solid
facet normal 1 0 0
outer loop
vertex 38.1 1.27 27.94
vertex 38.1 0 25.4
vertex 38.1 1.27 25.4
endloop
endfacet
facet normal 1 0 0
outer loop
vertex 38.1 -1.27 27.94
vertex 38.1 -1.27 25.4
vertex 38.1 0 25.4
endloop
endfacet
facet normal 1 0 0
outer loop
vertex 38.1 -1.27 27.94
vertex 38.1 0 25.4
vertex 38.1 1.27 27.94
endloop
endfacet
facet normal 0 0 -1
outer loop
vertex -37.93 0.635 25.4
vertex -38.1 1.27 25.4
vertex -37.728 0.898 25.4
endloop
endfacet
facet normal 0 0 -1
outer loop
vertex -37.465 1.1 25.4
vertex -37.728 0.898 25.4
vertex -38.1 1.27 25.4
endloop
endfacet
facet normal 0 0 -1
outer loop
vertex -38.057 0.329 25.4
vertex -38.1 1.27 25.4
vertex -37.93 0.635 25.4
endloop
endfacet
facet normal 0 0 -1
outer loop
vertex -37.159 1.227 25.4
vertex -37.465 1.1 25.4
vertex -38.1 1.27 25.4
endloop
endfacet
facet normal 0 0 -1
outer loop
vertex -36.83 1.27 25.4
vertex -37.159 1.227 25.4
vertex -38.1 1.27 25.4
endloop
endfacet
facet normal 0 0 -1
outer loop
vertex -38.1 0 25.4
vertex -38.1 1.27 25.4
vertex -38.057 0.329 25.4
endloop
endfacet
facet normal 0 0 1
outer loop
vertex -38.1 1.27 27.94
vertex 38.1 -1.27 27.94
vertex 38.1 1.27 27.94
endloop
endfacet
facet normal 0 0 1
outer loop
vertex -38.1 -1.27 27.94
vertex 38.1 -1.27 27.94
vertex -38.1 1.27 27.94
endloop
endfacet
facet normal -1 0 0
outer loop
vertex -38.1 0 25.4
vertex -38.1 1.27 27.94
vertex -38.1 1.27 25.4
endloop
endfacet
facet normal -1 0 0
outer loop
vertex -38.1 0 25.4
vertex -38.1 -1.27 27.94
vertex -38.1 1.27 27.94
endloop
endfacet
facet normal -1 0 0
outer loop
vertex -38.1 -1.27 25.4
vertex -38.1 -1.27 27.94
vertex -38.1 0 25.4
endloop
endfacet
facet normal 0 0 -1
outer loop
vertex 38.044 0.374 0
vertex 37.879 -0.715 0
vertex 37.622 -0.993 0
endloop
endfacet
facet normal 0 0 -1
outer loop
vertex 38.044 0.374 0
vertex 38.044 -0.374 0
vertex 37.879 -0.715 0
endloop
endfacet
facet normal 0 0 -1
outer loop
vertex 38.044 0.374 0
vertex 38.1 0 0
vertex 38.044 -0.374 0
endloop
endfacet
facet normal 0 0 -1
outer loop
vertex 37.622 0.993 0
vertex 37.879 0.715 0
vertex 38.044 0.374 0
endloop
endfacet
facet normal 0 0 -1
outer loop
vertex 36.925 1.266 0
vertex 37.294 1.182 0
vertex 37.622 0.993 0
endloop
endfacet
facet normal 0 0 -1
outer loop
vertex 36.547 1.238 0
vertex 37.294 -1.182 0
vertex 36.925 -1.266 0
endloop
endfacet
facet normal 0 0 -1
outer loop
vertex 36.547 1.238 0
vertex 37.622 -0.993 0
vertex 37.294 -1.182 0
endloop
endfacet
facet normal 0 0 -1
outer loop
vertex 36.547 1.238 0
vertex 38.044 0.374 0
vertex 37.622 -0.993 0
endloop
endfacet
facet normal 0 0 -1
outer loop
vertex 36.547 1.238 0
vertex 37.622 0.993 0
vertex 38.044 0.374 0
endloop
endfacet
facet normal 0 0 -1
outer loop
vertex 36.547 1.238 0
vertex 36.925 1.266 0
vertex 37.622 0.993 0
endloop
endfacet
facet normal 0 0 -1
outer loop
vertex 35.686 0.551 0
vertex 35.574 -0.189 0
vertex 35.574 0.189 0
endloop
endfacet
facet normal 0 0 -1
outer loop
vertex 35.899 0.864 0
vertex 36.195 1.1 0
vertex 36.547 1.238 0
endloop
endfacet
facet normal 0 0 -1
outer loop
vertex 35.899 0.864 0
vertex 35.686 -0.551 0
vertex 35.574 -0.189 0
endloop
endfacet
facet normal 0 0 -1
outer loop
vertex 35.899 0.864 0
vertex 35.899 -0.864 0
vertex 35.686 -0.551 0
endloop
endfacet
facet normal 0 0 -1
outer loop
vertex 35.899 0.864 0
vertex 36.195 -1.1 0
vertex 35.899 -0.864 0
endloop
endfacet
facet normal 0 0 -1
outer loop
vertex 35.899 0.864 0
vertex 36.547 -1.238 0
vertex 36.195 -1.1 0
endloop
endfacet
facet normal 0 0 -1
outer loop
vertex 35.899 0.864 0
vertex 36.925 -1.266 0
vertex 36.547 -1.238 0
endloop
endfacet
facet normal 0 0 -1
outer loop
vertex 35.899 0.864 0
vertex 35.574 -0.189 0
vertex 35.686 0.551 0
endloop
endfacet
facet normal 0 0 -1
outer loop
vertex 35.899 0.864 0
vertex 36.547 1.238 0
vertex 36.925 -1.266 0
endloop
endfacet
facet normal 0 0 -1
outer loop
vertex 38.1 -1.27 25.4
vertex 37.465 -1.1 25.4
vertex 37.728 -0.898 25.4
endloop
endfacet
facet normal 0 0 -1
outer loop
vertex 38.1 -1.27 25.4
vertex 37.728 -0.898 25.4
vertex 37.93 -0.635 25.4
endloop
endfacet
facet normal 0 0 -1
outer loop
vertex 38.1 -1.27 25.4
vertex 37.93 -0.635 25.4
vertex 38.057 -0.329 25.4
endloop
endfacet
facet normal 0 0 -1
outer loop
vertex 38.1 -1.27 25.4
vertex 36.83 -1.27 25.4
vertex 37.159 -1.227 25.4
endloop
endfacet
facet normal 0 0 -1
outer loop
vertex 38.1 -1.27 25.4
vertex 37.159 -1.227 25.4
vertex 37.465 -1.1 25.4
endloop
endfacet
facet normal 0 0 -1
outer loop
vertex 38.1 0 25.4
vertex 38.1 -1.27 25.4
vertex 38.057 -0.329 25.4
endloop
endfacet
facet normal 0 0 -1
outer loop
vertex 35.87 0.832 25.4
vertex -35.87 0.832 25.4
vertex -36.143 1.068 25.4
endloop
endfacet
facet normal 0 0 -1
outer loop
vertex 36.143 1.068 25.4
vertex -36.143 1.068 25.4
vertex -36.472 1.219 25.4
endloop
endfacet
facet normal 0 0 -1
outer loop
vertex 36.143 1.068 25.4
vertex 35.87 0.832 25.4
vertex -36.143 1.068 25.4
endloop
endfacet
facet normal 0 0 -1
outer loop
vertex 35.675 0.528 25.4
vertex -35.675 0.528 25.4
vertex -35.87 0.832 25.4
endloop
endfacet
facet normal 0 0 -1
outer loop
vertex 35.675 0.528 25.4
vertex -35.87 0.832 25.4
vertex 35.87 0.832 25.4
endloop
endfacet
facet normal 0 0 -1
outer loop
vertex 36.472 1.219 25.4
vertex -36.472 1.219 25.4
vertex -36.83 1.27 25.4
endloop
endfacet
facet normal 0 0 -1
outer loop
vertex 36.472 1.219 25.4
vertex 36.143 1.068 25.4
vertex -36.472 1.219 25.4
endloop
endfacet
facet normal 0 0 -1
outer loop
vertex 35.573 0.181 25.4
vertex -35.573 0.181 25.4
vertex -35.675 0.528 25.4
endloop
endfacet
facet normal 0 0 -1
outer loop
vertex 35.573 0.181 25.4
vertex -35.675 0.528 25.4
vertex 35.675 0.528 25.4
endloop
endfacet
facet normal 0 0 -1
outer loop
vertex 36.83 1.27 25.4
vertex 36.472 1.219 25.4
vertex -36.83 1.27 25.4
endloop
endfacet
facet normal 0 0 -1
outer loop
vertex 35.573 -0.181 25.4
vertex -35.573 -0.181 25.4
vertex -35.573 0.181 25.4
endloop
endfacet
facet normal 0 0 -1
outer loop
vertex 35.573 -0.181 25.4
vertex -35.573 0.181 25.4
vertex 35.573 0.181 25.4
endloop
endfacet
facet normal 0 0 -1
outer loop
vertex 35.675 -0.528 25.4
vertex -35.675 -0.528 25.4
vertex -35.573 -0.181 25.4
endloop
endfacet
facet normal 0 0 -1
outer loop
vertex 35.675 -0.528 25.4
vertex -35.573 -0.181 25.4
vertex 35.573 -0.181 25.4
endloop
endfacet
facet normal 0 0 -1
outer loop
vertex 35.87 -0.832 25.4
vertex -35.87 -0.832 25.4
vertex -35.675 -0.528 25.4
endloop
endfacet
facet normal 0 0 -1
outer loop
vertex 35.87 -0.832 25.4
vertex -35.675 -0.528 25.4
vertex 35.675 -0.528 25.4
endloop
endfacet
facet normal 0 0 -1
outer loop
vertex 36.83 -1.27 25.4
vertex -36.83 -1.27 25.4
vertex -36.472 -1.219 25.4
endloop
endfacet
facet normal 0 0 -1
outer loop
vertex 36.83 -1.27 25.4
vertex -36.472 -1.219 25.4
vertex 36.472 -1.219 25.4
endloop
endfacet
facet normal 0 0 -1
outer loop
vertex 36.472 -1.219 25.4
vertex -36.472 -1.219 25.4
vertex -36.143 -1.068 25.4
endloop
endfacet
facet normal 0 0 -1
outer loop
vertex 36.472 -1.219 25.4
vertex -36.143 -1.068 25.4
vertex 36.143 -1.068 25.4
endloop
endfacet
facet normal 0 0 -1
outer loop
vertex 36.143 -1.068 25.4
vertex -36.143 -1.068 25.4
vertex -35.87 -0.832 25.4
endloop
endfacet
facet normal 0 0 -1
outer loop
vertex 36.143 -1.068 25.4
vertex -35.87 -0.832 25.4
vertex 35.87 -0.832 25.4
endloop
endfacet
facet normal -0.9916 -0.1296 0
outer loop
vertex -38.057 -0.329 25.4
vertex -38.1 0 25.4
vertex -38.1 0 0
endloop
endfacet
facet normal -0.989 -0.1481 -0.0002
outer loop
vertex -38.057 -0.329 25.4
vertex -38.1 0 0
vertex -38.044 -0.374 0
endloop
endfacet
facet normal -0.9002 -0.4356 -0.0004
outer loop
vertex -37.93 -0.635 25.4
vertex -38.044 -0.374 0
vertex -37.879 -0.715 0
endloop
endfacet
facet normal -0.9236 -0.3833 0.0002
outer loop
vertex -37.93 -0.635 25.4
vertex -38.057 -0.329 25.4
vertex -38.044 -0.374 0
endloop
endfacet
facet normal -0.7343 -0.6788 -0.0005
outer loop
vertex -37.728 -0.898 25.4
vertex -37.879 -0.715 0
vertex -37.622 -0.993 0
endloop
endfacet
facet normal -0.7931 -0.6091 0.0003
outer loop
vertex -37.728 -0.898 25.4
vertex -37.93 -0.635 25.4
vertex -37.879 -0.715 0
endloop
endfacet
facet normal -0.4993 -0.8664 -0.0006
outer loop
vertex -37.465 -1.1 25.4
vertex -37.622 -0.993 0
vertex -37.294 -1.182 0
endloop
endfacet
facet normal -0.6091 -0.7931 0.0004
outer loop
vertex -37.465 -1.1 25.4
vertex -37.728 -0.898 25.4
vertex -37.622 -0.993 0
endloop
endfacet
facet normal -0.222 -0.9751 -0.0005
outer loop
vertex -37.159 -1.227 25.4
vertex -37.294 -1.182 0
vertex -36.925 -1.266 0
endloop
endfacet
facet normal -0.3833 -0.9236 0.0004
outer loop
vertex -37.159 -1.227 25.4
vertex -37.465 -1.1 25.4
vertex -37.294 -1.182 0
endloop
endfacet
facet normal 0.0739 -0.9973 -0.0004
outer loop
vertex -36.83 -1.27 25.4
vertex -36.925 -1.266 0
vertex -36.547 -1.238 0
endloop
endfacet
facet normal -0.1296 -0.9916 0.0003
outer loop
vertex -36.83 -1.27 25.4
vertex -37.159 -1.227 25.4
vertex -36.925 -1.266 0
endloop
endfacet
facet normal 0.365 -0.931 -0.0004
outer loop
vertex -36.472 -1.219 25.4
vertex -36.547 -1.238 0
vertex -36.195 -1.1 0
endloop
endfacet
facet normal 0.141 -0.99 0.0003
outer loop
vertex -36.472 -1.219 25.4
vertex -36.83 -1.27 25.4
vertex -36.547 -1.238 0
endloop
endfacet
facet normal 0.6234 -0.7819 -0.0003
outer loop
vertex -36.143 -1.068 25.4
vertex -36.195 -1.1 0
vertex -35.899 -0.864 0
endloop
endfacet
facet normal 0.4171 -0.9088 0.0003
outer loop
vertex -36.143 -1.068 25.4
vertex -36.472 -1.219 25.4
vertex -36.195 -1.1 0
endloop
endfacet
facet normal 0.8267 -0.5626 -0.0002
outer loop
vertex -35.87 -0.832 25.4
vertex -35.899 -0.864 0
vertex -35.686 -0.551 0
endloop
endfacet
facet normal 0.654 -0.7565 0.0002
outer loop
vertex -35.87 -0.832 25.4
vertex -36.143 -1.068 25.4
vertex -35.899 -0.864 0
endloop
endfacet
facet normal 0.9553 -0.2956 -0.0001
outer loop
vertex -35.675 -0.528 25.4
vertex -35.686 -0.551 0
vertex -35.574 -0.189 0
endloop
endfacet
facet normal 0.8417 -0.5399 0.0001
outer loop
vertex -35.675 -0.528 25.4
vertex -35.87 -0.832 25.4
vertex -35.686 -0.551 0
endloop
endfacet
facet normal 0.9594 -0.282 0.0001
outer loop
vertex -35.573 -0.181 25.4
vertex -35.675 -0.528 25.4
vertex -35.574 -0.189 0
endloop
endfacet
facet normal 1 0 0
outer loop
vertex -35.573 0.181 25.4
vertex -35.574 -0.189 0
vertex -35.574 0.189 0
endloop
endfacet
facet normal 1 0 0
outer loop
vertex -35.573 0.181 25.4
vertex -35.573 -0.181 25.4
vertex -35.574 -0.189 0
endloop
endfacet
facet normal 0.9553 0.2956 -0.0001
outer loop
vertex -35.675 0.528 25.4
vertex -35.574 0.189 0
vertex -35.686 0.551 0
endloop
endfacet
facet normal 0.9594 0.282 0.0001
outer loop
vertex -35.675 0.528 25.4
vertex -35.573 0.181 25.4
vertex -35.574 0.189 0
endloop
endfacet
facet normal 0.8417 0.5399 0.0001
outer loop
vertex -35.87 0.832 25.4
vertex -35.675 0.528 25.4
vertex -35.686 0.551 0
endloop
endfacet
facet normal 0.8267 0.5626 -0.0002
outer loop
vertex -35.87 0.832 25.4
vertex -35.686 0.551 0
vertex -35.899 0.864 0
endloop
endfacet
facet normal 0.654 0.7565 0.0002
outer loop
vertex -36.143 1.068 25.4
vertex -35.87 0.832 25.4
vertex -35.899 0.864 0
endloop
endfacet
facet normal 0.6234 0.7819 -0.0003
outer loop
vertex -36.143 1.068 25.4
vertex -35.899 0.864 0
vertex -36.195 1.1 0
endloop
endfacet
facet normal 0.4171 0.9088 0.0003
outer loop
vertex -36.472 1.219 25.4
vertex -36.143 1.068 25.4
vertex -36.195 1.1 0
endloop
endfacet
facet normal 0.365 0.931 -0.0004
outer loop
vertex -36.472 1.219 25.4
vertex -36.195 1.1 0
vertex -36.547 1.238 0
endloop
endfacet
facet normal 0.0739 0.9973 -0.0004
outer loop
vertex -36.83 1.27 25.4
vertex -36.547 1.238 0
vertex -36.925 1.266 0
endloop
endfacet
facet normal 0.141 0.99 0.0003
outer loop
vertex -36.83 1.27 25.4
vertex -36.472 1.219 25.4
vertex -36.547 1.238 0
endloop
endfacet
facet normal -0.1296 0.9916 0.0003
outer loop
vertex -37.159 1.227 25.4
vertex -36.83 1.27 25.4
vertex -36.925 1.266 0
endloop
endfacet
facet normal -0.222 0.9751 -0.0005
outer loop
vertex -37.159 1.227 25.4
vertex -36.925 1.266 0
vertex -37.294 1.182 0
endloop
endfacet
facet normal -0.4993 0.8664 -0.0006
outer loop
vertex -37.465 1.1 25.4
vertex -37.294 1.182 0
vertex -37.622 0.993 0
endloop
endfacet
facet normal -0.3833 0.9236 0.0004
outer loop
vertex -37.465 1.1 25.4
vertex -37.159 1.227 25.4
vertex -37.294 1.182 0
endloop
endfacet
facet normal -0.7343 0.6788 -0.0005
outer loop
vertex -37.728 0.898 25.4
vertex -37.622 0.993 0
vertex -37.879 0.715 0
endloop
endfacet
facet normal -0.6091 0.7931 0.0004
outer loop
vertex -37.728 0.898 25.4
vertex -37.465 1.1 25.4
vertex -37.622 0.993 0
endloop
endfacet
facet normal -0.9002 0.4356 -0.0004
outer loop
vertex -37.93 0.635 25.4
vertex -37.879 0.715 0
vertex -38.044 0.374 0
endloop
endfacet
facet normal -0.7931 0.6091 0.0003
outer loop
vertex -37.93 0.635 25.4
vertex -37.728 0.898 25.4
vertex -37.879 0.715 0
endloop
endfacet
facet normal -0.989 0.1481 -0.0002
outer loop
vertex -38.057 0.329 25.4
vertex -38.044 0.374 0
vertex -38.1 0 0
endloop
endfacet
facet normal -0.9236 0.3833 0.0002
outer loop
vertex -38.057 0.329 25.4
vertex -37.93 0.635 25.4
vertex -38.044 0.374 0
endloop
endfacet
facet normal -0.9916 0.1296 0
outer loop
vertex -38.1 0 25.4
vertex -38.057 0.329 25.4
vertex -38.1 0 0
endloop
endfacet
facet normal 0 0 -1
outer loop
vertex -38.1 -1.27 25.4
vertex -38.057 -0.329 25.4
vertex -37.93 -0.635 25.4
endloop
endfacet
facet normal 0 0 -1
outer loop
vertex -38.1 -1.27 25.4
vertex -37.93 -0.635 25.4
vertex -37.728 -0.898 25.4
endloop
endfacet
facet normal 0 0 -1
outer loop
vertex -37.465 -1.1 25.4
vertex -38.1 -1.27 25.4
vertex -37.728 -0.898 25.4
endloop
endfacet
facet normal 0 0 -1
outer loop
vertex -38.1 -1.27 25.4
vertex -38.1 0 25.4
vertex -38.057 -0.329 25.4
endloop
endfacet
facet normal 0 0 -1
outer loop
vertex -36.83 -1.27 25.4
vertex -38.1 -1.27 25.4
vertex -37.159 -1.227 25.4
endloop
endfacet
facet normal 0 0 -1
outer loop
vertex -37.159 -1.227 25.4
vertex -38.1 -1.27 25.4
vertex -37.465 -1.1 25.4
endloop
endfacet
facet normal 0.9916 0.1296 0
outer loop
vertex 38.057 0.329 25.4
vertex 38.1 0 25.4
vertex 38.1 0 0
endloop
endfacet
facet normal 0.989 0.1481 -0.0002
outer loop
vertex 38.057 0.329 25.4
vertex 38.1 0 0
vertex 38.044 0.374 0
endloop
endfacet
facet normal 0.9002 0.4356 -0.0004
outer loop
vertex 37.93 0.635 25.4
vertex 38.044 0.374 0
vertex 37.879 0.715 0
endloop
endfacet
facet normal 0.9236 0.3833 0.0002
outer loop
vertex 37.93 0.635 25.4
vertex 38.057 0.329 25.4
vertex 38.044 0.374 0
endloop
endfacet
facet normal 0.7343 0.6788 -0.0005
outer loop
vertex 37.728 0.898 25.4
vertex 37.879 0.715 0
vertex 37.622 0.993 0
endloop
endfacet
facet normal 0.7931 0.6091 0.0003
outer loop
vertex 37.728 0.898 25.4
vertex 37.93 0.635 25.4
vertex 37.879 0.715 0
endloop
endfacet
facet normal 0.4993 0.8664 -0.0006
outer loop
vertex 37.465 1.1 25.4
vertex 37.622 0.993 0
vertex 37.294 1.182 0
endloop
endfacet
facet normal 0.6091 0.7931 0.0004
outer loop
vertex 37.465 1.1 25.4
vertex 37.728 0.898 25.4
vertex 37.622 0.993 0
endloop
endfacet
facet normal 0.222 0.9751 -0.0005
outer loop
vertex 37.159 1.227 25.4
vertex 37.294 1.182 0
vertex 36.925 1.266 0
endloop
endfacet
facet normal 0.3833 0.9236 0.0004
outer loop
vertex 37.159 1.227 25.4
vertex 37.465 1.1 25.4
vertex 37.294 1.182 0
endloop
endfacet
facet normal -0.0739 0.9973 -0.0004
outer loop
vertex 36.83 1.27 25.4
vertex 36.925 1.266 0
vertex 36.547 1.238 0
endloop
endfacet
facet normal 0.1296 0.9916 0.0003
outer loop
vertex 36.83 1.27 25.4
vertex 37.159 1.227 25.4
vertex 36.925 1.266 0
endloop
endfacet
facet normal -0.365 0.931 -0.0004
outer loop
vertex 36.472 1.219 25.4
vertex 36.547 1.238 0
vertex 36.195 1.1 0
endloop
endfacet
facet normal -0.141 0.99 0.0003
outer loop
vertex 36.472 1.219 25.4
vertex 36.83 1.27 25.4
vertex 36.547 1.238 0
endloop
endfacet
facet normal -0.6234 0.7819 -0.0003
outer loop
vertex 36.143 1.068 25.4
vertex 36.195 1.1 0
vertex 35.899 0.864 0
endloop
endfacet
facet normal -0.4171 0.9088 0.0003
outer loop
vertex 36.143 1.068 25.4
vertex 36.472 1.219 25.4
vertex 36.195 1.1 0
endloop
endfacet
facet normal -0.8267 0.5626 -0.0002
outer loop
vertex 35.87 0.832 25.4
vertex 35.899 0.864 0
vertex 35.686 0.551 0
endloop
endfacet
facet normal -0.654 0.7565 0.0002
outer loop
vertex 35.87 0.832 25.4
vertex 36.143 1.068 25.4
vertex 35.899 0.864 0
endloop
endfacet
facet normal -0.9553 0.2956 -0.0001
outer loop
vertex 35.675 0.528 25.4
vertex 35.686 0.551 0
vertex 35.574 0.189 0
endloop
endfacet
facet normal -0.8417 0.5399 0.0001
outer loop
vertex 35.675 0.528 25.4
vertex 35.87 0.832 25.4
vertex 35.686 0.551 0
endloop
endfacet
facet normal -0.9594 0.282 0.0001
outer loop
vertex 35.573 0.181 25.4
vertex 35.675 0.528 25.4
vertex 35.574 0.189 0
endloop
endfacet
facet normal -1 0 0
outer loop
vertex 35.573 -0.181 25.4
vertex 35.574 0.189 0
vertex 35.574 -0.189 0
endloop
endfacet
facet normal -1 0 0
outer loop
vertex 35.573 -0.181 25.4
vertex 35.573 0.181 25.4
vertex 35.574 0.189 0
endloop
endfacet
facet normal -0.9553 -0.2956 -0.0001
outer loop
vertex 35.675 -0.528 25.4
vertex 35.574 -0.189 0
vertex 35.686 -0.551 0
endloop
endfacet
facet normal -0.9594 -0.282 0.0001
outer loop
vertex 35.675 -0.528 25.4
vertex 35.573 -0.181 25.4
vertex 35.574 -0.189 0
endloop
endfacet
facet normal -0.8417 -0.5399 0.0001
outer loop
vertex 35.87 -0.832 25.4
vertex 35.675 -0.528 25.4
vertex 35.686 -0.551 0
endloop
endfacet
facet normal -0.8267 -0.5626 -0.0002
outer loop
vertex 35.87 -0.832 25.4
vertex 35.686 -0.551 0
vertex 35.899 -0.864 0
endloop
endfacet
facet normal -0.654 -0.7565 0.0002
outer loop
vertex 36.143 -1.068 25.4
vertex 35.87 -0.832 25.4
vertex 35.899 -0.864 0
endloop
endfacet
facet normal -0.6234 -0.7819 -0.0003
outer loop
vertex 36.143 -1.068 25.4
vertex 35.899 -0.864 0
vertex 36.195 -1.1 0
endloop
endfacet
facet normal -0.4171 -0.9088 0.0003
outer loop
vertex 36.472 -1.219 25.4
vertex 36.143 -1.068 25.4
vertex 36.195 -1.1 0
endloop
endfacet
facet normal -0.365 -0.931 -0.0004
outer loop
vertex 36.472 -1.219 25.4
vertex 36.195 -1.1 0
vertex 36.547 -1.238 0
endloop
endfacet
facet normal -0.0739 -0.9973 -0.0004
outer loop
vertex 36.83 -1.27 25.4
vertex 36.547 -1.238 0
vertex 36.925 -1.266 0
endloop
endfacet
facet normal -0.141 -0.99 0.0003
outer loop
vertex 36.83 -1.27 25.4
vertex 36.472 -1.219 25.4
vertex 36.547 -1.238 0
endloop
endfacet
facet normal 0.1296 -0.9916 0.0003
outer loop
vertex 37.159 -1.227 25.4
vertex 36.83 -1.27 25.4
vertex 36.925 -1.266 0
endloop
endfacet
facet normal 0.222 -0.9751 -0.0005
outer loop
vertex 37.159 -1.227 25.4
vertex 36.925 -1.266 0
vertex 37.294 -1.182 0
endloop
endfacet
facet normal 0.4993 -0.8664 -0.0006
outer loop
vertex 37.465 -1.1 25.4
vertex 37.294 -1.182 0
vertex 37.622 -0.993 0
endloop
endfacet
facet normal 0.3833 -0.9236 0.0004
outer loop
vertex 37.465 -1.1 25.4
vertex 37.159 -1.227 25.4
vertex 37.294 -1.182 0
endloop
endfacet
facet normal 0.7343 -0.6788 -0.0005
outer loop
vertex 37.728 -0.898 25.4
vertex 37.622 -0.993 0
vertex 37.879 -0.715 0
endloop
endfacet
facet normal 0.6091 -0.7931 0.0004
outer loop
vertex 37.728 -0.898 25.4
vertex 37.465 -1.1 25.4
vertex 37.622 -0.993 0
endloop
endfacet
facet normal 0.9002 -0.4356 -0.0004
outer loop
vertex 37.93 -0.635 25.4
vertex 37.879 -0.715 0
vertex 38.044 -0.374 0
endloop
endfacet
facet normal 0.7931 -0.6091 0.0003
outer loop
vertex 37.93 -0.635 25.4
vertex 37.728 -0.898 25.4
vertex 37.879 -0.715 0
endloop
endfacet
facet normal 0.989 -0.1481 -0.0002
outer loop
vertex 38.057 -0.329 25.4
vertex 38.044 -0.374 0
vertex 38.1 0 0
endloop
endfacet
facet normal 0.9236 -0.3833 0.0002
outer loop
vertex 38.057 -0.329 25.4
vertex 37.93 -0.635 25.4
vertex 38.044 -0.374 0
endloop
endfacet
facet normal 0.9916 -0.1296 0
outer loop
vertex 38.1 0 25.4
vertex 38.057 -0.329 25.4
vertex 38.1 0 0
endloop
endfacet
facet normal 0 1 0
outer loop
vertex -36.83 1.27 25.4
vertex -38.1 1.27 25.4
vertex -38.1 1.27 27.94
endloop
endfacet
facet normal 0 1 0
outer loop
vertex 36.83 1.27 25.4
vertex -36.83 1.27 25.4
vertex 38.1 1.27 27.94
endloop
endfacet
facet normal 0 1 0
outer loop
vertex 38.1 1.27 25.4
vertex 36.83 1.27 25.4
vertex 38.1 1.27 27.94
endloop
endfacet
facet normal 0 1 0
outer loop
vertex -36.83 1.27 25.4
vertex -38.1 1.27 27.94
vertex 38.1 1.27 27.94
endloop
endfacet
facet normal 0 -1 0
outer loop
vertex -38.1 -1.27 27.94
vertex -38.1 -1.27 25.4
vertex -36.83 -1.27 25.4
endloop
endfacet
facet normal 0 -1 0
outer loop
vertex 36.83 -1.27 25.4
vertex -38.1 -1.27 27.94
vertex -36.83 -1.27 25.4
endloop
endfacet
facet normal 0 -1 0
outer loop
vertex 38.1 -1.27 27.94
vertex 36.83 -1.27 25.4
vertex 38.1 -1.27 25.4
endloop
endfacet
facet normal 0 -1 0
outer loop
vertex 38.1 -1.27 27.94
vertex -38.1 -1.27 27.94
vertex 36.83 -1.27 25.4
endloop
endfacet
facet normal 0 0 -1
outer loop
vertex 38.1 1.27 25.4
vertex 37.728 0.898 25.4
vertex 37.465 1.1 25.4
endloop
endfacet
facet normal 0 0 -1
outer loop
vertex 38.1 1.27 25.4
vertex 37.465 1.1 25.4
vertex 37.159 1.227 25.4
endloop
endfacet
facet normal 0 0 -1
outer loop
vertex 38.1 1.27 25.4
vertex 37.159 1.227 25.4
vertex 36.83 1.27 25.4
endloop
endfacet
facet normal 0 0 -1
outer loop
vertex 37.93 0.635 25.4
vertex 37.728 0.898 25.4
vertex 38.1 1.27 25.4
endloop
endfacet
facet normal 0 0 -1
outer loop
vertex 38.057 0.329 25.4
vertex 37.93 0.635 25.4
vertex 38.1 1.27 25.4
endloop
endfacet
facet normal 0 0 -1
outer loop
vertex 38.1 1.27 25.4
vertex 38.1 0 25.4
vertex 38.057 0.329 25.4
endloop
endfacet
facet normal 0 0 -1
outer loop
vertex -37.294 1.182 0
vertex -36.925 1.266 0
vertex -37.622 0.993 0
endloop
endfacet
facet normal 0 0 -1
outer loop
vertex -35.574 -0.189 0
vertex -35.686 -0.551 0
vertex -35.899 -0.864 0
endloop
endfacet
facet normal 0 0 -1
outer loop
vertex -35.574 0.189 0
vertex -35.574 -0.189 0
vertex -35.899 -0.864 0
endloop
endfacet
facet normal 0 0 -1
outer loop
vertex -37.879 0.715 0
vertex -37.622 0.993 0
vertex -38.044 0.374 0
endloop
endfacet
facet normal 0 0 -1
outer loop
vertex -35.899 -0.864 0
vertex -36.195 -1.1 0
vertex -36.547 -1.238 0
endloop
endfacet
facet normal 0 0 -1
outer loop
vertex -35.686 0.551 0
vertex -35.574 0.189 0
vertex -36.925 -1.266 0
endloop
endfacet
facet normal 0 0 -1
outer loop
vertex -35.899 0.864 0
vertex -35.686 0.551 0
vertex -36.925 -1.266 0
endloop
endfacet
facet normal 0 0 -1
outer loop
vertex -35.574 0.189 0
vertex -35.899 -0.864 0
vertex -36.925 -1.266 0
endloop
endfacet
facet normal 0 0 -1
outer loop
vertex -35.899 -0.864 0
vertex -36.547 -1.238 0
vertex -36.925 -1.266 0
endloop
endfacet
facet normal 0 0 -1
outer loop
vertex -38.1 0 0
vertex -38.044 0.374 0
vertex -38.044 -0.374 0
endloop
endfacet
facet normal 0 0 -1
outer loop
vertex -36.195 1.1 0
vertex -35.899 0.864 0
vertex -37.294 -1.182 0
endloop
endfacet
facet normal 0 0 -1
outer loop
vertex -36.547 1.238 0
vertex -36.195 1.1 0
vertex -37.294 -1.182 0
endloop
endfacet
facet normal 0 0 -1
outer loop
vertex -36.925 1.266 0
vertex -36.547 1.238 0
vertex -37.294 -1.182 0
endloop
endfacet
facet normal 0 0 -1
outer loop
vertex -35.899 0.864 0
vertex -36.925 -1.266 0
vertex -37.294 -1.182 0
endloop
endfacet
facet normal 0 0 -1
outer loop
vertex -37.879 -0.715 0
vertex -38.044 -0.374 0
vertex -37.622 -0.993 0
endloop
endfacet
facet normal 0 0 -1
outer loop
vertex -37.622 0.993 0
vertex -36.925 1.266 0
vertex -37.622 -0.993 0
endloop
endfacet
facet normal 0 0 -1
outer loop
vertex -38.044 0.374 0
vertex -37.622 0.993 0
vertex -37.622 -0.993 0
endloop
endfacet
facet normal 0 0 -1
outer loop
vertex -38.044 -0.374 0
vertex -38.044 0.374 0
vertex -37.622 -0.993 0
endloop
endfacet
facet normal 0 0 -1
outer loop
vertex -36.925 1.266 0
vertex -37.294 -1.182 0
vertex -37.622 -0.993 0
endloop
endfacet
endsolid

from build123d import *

# Parameters (mm, degrees)
F1_DEPTH = 1.27
F0_W     = 1.27
F0_H     = 25.4


with BuildPart() as f1:
    # F0 (on Front) → F1 (new body, symmetric)
    with BuildSketch(Plane.XZ):
        Polygon((-38.1, 27.94), (-38.1, 25.4), (-36.83, 25.4), (36.83, 25.4), (38.1, 25.4), (38.1, 27.94), align=None)
    extrude(amount=F1_DEPTH, both=True)

    # F0 (on Front) → F2 (revolve)
    with BuildSketch(Plane.XZ):
        with Locations((-37.465, 12.7)):
            Rectangle(F0_W, F0_H)
    revolve(axis=Axis((-36.83, 0, 12.7), (0, 0, 1)))

    # F0 (on Front) → F3 (revolve)
    with BuildSketch(Plane.XZ):
        with Locations((37.465, 12.7)):
            Rectangle(F0_W, F0_H)
    revolve(axis=Axis((36.83, 0, 12.7), (0, 0, 1)))


solid = f1.part
